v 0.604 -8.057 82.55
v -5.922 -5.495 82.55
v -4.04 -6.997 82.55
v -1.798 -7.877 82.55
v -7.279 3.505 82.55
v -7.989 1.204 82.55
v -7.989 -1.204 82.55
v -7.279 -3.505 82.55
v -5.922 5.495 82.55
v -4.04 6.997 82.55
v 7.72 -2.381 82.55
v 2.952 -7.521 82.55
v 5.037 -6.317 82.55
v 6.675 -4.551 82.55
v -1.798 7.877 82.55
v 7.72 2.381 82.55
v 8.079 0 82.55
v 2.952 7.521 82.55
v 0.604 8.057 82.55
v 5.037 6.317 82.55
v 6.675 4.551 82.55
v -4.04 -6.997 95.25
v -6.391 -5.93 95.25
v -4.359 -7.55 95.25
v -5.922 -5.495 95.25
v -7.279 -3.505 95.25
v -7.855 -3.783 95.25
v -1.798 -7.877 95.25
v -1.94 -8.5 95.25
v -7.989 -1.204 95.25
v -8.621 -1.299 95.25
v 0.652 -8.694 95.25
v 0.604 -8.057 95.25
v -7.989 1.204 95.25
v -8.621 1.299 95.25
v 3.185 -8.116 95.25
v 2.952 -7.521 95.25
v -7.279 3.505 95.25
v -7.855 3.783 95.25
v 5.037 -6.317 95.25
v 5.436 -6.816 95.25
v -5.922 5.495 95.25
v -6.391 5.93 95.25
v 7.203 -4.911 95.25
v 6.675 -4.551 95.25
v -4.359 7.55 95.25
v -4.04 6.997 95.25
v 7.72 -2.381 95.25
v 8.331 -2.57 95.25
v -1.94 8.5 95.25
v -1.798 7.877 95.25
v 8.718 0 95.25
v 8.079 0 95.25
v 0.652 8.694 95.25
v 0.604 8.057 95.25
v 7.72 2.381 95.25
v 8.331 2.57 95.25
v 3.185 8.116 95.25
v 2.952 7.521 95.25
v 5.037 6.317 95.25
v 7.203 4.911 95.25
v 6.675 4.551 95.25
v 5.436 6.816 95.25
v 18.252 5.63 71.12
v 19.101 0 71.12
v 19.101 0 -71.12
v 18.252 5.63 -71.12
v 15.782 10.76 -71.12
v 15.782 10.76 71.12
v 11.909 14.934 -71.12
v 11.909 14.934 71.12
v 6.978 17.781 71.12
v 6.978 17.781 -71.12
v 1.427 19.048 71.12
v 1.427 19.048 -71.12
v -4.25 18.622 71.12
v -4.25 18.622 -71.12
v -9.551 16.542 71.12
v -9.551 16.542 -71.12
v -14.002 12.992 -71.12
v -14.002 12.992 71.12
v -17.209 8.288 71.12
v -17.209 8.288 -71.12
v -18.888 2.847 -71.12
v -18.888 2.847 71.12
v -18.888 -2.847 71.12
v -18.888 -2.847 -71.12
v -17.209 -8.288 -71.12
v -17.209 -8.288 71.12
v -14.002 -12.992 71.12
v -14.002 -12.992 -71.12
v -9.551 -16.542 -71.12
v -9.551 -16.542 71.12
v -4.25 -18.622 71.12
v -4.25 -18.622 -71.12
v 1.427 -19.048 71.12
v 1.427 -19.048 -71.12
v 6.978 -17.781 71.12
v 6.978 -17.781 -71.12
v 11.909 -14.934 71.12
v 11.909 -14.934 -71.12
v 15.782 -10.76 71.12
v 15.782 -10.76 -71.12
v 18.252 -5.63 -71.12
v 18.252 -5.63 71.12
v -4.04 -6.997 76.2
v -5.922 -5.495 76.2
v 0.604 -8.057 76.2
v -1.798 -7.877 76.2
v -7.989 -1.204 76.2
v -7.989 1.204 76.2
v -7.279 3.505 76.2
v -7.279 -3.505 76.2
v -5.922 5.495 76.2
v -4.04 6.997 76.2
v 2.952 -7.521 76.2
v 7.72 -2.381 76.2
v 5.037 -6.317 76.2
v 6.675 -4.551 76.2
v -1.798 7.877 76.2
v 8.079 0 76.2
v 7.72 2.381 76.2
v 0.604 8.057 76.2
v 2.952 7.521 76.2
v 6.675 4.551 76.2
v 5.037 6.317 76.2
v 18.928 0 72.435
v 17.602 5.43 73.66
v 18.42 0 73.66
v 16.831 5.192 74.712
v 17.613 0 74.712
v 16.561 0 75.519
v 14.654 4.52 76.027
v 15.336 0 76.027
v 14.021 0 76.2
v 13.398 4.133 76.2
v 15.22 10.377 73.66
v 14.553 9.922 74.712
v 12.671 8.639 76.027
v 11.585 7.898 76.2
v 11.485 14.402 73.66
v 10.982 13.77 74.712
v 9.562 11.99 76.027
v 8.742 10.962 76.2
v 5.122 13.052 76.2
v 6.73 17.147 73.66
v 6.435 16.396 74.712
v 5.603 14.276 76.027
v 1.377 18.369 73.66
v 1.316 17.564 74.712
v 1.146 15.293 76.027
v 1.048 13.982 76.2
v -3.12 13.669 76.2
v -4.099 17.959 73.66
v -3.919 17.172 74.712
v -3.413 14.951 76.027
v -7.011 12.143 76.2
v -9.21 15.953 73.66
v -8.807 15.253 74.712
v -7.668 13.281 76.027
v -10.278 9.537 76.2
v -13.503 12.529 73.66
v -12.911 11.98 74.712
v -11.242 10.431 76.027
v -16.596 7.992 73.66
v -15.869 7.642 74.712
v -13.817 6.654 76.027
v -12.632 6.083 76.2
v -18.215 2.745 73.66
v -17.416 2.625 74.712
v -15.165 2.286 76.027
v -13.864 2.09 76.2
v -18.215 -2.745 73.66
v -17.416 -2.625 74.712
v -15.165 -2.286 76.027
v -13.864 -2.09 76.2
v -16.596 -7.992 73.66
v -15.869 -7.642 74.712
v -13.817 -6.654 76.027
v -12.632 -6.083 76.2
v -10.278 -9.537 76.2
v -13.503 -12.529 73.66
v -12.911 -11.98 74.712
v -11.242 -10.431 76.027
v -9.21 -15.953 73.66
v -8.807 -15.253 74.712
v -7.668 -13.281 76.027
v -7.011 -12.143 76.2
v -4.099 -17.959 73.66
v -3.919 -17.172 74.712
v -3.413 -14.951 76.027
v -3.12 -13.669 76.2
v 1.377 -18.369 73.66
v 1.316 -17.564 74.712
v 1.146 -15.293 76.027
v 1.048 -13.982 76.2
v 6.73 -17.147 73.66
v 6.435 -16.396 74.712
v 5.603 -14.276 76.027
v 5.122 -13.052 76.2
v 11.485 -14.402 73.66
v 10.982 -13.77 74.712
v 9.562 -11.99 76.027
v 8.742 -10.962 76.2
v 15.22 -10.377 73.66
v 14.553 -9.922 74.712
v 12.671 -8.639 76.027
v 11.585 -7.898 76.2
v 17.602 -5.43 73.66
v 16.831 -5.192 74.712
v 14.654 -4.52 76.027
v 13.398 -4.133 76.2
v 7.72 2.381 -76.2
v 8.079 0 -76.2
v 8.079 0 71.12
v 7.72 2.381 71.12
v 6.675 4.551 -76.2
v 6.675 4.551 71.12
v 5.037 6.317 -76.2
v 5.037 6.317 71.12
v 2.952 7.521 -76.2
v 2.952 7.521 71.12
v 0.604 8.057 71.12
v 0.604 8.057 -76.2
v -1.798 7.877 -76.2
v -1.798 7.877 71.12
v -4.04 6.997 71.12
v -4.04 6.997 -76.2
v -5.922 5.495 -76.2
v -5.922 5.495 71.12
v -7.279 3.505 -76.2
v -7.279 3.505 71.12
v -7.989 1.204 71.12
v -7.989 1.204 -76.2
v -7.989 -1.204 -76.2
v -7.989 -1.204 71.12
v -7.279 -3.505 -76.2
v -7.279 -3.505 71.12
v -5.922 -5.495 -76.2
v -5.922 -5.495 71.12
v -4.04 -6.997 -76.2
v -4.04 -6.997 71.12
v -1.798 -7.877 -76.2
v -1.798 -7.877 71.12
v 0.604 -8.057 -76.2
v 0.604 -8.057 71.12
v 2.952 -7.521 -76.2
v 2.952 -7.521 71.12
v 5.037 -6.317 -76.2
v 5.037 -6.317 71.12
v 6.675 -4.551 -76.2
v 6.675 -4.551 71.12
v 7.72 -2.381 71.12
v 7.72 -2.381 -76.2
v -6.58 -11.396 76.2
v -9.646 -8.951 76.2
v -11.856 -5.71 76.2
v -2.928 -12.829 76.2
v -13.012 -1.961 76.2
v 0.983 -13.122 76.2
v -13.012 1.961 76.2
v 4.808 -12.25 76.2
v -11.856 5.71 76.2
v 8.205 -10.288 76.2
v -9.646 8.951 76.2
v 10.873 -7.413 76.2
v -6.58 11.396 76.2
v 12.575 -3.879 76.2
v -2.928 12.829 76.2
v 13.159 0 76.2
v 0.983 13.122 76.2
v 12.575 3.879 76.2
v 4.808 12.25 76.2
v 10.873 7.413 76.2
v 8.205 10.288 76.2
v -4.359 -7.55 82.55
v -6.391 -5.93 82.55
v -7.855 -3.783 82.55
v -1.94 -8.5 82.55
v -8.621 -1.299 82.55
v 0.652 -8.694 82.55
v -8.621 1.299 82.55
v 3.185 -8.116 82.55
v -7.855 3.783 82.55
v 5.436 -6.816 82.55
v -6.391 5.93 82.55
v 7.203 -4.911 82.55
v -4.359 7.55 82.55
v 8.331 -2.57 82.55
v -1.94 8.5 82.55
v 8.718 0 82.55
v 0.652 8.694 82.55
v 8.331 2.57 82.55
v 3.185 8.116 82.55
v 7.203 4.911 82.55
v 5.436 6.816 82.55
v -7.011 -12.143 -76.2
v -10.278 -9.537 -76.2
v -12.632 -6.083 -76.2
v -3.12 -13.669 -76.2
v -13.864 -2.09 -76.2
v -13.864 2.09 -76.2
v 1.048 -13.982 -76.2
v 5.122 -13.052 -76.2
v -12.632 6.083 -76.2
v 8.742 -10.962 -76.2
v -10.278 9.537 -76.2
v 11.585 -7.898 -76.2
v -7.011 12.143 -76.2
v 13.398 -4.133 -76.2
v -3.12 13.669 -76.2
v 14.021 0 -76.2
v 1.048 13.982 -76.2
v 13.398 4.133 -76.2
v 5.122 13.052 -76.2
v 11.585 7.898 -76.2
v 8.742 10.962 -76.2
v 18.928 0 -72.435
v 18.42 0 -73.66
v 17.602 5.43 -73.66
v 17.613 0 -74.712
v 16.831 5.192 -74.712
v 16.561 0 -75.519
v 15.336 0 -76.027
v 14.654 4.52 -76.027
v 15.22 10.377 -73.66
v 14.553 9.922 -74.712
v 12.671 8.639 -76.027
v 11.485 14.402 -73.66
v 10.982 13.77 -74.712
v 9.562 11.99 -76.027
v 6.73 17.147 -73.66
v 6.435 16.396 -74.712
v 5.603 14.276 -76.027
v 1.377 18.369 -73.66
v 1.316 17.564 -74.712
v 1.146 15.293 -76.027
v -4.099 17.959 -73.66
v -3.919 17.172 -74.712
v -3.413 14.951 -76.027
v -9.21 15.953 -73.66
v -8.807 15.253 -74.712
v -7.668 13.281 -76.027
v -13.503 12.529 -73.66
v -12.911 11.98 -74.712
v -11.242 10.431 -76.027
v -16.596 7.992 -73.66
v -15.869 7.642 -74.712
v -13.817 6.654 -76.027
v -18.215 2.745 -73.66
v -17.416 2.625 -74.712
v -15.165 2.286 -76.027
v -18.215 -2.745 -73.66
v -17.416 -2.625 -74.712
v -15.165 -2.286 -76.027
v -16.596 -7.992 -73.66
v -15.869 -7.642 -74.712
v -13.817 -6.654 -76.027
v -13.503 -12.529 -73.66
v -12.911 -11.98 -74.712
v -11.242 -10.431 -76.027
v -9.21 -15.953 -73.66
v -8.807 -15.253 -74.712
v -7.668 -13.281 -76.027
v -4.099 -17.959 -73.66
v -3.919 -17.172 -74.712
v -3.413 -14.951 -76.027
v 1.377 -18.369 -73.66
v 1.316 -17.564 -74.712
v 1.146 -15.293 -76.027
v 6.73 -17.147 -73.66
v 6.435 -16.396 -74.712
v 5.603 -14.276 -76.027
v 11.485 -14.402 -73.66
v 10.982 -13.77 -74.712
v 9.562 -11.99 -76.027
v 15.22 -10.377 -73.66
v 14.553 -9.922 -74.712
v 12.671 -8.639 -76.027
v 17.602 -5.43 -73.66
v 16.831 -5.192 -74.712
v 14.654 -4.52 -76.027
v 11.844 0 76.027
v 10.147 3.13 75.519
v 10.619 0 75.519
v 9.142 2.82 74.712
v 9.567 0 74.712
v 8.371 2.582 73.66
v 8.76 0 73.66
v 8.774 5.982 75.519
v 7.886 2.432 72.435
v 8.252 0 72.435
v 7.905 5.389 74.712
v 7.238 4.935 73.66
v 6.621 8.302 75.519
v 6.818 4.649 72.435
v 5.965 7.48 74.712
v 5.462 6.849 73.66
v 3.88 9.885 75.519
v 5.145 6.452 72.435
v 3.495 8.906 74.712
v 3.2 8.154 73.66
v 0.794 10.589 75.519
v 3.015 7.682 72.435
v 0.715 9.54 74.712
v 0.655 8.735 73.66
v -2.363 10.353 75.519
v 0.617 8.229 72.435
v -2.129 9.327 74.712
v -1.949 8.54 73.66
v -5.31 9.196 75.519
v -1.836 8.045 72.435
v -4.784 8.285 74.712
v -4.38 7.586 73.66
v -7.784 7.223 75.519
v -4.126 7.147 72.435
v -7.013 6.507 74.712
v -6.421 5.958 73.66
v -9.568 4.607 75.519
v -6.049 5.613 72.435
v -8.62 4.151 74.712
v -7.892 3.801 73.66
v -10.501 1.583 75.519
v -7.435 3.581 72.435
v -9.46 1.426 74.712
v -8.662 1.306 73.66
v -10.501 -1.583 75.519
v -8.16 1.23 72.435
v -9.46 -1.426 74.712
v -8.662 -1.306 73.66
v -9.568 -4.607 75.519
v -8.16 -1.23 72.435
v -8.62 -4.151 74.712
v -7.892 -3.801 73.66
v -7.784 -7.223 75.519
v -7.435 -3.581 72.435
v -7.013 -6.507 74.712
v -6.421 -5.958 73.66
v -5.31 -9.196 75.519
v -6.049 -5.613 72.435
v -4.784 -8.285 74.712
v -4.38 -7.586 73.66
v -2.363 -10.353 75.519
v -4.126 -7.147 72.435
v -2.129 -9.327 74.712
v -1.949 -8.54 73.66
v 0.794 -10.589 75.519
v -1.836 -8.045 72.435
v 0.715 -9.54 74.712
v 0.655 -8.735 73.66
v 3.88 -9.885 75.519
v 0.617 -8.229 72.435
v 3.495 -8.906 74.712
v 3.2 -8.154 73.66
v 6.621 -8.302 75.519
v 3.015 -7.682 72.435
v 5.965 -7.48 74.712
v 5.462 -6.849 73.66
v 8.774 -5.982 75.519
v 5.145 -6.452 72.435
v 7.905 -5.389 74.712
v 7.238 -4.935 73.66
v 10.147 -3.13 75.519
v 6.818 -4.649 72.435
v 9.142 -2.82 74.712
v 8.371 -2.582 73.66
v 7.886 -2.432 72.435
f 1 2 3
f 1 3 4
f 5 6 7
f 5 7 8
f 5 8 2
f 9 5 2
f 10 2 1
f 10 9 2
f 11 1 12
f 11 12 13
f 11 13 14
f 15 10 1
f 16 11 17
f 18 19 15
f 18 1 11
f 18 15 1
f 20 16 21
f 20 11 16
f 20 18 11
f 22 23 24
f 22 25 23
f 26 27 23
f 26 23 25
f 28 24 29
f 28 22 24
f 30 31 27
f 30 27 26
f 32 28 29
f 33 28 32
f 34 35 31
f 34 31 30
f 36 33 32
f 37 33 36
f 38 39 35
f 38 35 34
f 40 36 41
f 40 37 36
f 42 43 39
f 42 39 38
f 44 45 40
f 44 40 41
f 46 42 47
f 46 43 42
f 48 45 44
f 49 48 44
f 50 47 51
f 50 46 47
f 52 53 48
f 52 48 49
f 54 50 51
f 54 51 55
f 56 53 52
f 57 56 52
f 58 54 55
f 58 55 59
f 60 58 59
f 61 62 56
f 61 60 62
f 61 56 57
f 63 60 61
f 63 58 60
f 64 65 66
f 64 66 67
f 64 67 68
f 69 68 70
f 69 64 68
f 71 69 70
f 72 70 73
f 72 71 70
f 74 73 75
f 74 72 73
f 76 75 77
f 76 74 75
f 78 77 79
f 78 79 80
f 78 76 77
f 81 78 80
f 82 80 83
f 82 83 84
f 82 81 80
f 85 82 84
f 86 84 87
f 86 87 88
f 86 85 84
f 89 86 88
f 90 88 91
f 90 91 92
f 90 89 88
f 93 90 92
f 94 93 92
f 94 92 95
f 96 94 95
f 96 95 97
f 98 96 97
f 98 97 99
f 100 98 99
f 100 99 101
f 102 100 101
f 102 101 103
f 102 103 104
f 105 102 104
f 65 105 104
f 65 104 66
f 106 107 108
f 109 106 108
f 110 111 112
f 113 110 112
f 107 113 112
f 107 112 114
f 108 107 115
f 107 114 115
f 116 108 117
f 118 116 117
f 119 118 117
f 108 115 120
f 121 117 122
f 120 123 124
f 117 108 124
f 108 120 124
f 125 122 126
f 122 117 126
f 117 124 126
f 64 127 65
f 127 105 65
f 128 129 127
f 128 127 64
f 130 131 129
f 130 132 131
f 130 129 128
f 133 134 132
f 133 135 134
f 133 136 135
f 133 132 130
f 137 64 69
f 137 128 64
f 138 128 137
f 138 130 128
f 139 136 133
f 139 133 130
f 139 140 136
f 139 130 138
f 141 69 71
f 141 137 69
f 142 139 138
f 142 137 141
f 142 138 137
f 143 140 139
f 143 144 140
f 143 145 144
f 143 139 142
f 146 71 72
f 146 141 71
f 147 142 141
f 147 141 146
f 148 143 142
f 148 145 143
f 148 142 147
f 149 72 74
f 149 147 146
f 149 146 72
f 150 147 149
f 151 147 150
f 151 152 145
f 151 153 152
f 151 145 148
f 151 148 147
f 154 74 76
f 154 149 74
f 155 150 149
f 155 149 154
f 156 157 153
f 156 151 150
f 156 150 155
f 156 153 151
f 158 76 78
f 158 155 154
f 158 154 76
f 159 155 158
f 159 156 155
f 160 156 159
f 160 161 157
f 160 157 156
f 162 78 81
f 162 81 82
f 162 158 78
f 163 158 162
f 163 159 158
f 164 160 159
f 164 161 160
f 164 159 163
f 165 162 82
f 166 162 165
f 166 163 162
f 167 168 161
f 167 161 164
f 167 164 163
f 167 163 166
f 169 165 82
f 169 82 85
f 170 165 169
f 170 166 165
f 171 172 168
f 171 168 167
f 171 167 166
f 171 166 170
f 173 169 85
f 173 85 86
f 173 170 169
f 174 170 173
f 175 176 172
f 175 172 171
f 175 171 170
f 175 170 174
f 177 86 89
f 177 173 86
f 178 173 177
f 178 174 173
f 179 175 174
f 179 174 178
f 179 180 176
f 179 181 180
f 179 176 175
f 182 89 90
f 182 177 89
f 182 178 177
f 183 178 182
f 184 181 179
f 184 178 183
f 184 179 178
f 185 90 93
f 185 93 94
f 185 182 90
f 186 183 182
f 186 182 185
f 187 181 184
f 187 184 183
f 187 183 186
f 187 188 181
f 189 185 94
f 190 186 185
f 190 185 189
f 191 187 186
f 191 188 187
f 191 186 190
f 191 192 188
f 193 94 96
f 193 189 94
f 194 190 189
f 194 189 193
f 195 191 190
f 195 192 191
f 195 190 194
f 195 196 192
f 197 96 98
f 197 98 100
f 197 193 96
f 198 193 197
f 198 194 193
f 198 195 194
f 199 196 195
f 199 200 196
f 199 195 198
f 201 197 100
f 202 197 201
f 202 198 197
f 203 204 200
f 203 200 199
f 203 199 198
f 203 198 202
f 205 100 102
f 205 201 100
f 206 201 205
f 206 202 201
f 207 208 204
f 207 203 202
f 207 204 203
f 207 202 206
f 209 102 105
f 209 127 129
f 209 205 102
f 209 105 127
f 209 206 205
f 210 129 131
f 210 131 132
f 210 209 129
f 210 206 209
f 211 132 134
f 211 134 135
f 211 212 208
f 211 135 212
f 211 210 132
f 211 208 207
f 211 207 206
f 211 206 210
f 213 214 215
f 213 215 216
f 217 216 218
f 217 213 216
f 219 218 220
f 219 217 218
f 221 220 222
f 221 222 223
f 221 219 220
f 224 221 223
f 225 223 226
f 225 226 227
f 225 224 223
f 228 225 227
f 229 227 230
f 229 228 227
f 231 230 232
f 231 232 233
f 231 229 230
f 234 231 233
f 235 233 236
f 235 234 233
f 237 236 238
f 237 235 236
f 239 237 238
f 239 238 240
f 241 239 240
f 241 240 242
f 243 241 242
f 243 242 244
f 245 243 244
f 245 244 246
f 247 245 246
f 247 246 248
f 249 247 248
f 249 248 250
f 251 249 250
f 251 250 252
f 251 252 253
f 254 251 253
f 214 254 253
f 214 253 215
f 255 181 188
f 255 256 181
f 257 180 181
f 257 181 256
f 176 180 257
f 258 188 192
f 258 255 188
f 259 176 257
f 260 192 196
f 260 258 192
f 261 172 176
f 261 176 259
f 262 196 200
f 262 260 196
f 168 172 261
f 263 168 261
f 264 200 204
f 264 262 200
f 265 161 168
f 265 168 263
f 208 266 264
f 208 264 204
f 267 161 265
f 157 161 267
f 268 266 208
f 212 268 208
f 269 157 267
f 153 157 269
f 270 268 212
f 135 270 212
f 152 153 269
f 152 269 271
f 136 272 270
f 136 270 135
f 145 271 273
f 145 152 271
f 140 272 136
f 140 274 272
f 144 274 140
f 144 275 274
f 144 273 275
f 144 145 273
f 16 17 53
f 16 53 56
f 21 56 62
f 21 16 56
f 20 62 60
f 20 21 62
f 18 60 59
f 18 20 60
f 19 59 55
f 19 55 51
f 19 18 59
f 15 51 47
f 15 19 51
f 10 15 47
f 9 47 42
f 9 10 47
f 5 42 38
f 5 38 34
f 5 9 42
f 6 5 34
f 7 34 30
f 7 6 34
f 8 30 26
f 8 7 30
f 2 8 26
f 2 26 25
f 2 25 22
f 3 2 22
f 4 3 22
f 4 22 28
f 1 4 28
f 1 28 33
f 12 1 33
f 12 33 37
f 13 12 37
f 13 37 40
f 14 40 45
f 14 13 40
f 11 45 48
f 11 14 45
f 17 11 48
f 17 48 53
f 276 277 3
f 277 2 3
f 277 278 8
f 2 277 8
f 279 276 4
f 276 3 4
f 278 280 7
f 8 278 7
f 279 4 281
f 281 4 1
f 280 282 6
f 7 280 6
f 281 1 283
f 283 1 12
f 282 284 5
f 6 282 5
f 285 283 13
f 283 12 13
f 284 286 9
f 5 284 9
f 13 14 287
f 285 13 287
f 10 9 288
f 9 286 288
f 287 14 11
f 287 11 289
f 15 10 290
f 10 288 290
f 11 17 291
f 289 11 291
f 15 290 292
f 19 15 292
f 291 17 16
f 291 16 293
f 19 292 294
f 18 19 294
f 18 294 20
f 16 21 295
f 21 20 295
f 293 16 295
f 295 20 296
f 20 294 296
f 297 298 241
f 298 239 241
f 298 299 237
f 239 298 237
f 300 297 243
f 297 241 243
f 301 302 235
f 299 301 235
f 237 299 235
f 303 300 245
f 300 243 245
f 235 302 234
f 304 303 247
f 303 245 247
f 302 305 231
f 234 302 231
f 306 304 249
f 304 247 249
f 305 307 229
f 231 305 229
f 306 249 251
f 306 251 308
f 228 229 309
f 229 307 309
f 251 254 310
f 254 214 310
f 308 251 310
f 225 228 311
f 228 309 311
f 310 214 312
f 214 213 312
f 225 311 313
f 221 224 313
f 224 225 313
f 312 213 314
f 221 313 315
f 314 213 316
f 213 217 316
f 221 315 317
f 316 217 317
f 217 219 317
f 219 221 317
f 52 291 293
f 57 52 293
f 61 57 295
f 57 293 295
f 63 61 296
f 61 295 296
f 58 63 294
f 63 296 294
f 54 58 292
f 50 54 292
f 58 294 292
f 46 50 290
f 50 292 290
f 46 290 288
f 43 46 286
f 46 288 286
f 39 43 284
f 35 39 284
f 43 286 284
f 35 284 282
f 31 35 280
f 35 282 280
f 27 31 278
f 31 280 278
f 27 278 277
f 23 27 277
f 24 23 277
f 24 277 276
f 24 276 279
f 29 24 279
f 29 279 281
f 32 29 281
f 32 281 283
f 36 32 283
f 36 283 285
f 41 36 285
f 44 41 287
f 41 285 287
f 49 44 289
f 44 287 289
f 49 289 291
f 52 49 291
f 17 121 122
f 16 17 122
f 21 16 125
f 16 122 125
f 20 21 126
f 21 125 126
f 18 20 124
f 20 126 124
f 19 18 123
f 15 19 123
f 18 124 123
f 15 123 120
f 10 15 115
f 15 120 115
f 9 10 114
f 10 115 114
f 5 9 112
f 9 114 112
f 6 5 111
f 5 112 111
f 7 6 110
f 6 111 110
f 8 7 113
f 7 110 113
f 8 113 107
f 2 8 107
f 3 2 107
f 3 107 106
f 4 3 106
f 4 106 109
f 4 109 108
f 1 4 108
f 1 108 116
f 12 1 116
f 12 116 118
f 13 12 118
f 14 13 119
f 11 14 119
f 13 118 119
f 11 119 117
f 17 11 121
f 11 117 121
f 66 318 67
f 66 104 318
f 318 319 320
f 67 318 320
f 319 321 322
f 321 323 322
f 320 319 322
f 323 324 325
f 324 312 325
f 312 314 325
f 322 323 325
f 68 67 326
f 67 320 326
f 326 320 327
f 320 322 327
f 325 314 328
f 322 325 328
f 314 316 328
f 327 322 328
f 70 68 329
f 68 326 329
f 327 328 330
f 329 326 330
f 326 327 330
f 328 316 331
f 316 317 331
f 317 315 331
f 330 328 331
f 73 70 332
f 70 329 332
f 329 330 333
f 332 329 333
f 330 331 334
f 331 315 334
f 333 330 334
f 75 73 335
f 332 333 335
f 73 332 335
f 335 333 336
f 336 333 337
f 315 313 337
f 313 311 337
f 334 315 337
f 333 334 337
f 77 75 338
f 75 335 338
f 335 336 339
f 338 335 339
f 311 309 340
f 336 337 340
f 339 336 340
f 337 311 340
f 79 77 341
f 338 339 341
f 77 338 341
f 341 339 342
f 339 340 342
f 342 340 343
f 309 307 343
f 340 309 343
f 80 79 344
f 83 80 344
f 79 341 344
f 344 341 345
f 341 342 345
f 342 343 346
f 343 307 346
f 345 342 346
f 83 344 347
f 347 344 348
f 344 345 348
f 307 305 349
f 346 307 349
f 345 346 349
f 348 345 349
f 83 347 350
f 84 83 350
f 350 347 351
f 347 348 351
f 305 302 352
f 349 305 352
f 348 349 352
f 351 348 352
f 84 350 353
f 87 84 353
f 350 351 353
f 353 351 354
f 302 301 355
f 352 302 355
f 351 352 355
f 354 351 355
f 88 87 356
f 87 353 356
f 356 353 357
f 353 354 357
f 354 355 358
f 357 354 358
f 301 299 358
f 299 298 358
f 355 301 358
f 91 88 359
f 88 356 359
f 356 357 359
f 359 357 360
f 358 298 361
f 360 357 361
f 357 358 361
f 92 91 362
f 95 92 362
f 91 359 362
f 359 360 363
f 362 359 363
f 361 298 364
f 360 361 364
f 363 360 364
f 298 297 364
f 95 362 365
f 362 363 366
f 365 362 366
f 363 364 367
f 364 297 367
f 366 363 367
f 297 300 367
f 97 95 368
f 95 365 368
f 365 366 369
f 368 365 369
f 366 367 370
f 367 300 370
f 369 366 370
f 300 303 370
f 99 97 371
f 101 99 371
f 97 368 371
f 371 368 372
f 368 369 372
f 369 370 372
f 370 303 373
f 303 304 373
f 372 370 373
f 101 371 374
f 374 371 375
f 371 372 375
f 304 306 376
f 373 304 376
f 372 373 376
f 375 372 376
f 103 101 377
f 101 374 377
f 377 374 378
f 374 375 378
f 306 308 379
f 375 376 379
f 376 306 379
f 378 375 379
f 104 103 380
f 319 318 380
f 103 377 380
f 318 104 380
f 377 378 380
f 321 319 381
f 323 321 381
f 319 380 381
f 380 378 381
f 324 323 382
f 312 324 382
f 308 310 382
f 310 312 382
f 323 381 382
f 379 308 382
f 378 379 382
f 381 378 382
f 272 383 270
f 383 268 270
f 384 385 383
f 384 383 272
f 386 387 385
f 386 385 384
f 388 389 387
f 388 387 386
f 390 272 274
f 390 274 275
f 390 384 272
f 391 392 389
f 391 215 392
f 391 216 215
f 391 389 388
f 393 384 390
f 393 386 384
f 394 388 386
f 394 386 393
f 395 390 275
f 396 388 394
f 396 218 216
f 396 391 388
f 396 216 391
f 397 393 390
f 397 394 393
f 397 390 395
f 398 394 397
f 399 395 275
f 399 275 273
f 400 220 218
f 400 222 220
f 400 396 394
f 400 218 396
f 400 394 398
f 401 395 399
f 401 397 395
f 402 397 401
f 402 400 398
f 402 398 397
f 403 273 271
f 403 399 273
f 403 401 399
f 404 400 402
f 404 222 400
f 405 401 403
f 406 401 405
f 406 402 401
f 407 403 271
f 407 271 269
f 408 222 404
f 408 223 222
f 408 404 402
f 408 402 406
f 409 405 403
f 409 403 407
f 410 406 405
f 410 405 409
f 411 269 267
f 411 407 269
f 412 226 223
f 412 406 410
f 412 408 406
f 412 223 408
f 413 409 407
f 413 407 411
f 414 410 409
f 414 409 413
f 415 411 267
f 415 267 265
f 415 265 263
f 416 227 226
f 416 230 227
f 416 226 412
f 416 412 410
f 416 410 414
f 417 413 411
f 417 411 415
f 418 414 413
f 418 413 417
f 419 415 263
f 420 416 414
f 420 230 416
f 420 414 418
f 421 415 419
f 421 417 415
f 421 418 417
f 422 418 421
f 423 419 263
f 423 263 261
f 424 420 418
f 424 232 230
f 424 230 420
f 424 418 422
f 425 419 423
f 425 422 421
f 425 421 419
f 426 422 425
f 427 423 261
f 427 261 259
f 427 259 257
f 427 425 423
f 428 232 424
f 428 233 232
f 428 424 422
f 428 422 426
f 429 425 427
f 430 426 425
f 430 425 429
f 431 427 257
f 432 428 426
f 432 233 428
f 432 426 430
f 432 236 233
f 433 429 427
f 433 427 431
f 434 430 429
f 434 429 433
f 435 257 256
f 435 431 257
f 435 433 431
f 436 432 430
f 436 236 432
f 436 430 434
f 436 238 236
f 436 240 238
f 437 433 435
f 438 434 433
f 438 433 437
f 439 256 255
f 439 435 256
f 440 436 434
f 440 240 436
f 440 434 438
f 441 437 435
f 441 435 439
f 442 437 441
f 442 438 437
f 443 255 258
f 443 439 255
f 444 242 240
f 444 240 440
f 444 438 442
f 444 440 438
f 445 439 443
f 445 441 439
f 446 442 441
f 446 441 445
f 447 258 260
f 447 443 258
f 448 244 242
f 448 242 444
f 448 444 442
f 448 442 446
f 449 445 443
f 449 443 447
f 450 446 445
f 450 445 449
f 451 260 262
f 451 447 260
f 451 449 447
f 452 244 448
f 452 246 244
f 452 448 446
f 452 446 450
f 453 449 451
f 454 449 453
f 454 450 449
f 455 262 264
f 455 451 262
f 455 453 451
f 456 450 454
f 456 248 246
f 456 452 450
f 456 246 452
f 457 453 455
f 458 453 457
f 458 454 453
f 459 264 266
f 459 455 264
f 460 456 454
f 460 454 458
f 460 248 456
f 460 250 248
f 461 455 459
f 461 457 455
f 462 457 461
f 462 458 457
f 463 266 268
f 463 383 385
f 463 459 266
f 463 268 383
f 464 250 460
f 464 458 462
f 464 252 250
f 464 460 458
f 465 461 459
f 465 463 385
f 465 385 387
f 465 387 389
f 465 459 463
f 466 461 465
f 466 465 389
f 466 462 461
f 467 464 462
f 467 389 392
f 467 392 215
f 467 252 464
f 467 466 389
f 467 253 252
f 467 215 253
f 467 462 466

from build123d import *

# Parameters (mm, degrees)
F0_R     = 19.1010102766
F0_R_2   = 8.0791616643
F1_DEPTH = 76.2
F3_R     = 5.08
F2_R     = 8.0791616643
F4_DEPTH = 6.35
F6_R     = 5.08
F7_R     = 8.7181621078
F7_R_2   = 8.0791616643
F8_DEPTH = 12.7


with BuildPart() as f1:
    # F0 (on Top) → F1 (new body, symmetric)
    with BuildSketch(Plane.XY):
        Circle(F0_R)
        Circle(F0_R_2, mode=Mode.SUBTRACT)
    extrude(amount=F1_DEPTH, both=True)

    # F3
    f3_edges = [f1.edges().sort_by_distance(p)[0] for p in [
        (-19.10101, 0, -76.2),
    ]]
    fillet(f3_edges, radius=F3_R)

    # F6
    f6_edges = [f1.edges().sort_by_distance(p)[0] for p in [
        (-19.10101, 0, 76.2),
        (-8.079162, 0, 76.2),
    ]]
    fillet(f6_edges, radius=F6_R)


with BuildPart() as f4:
    # F2 (on face) → F4 (new body)
    with BuildSketch(Plane.XY.offset(76.2)):
        Circle(F2_R)
    extrude(amount=F4_DEPTH)


with BuildPart() as f8:
    # F7 (on face) → F8 (new body)
    with BuildSketch(Plane.XY.offset(82.55)):
        Circle(F7_R)
        Circle(F7_R_2, mode=Mode.SUBTRACT)
    extrude(amount=F8_DEPTH)


solid = Compound([f1.part, f4.part, f8.part])
